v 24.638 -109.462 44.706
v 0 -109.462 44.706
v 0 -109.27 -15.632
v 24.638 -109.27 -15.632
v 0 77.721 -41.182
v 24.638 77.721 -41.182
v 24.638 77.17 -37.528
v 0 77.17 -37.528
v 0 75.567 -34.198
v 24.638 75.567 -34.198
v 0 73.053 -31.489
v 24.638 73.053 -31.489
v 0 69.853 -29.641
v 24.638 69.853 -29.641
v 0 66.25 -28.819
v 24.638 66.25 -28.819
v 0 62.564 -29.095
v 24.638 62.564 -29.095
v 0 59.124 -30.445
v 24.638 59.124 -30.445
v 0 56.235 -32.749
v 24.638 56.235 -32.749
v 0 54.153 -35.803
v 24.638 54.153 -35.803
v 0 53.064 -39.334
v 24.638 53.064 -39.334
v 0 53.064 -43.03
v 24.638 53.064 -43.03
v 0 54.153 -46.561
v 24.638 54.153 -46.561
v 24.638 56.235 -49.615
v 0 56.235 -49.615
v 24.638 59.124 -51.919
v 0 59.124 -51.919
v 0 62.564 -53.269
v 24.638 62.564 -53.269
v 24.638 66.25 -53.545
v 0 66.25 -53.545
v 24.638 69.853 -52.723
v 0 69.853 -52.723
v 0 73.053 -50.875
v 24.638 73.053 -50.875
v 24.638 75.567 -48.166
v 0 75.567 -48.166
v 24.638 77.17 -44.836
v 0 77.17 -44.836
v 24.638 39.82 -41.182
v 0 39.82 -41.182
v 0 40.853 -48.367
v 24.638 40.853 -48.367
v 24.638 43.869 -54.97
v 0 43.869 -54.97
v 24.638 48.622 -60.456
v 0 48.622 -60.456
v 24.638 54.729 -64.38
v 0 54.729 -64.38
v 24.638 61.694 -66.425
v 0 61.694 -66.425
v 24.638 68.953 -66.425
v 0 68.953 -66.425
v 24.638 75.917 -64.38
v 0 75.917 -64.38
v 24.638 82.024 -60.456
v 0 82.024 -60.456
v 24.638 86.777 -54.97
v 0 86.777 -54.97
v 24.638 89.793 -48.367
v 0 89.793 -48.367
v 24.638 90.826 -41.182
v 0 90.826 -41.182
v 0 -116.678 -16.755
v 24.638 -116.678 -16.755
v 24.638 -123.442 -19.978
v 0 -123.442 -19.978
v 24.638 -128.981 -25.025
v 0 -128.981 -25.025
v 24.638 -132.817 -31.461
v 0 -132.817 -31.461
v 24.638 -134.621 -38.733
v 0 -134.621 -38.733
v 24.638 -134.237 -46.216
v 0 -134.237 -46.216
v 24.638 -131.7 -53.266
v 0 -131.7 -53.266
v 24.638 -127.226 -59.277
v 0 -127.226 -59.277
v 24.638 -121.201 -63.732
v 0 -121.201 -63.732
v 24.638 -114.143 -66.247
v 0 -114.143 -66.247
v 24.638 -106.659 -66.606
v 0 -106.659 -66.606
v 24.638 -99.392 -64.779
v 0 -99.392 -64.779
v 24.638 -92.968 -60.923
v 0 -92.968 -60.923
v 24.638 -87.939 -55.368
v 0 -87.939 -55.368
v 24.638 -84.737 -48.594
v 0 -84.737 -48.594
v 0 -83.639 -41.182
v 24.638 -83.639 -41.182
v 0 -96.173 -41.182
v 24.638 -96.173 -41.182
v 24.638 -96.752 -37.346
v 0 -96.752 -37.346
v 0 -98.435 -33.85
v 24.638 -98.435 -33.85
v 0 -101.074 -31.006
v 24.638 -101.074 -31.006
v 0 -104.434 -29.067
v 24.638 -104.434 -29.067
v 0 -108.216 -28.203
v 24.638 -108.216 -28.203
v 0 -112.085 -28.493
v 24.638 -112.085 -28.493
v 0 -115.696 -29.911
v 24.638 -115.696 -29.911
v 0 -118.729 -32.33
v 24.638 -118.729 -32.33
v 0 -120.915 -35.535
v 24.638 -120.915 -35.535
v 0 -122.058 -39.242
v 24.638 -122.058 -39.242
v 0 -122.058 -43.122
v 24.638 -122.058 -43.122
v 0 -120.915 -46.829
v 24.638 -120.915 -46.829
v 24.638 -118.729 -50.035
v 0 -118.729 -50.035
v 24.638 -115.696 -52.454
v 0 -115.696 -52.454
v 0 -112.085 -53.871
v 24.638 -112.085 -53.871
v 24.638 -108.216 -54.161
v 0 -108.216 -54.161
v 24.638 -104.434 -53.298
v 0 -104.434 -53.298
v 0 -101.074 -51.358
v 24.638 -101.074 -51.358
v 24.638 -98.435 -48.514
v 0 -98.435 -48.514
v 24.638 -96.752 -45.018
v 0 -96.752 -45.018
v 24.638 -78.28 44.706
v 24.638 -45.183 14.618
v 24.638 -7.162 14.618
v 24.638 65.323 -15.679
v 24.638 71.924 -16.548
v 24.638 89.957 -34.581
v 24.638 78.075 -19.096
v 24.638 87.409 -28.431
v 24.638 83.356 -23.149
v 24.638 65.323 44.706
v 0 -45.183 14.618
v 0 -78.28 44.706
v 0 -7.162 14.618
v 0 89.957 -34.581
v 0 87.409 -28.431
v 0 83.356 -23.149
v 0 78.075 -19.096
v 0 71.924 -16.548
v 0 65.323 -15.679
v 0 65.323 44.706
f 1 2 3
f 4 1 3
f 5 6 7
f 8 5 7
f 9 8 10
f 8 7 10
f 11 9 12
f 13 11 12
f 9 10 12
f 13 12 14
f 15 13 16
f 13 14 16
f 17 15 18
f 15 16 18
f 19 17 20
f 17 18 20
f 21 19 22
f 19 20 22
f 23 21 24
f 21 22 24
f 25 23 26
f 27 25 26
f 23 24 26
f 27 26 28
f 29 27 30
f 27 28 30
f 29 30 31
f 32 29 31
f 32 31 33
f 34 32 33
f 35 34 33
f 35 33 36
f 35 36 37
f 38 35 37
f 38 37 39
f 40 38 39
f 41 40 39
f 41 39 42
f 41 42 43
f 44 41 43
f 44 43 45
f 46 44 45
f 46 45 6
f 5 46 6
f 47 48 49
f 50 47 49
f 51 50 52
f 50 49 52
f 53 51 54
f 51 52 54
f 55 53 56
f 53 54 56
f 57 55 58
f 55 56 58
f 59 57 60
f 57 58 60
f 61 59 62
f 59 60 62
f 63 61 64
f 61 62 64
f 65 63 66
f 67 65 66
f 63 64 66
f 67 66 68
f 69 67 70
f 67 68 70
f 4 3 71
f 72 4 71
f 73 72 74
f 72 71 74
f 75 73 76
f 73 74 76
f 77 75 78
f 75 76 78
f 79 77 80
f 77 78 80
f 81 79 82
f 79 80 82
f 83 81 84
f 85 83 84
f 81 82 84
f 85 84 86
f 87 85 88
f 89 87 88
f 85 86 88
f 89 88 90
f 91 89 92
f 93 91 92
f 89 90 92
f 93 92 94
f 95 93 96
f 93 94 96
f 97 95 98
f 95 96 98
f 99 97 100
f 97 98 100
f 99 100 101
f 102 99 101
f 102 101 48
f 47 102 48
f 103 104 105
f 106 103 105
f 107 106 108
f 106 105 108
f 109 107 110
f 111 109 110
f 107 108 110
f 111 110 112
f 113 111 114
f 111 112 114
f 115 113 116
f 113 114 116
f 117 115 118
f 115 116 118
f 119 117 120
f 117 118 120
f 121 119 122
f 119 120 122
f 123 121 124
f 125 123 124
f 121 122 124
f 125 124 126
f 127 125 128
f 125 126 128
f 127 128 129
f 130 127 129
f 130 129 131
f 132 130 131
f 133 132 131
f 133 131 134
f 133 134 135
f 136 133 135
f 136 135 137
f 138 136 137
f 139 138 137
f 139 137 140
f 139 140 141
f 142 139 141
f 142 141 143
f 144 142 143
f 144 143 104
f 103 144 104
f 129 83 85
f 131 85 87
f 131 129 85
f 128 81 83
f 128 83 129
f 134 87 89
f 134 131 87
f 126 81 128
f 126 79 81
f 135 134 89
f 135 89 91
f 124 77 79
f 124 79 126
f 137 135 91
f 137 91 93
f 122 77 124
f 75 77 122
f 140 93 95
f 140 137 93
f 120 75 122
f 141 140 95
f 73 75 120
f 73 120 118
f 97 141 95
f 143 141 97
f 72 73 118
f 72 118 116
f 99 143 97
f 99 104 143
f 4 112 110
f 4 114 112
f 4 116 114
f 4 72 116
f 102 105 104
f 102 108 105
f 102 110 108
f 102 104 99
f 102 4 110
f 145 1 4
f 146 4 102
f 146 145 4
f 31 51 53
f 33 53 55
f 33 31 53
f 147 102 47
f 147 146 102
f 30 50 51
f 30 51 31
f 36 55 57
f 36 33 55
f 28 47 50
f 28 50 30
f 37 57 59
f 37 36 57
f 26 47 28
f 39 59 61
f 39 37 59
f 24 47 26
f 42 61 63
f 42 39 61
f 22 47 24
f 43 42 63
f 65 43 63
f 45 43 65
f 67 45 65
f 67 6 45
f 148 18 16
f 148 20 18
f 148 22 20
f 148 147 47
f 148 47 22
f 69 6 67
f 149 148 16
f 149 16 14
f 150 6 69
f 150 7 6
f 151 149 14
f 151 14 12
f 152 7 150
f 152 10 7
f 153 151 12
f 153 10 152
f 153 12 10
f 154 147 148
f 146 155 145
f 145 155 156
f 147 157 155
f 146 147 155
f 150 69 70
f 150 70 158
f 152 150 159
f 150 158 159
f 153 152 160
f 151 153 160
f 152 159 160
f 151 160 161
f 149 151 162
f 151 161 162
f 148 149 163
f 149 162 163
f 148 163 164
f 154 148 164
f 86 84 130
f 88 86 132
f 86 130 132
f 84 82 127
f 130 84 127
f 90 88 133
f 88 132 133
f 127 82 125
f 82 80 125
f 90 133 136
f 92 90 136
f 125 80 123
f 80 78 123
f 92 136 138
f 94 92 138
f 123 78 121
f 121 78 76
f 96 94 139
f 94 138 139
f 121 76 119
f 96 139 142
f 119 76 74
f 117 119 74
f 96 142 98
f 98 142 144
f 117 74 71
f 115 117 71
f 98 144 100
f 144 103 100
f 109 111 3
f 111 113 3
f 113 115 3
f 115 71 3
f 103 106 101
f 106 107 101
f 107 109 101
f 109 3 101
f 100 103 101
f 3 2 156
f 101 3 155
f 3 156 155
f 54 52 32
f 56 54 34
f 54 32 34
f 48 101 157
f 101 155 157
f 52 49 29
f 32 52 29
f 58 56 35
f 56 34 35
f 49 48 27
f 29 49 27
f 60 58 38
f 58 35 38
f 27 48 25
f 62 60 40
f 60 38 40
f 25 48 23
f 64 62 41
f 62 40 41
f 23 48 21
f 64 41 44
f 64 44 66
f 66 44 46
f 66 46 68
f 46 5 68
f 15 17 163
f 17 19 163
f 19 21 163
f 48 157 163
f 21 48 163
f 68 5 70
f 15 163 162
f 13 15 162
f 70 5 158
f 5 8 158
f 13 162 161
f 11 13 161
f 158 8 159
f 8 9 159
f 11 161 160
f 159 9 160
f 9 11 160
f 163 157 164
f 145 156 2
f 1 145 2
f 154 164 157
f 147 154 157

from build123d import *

# Parameters (mm, degrees)
F1_DEPTH = 24.638
F2_R     = 13.015145
F2_R_2   = 12.398002
F3_DEPTH = 35.052


with BuildPart() as f1:
    # F0 (on Right) → F1 (new body)
    with BuildSketch(Plane.YZ):
        with BuildLine():
            Line((-109.188519, -41.18206), (-109.269887, -15.63245))
            ThreePointArc((-109.269887, -15.63245), (-127.226123, -59.277199), (-83.63878, -41.18206))
            Line((-83.63878, -41.18206), (-109.188519, -41.18206))
        make_face()
        with BuildLine():
            ThreePointArc((-83.63878, -41.18206), (-91.150916, -23.086921), (-109.269887, -15.63245))
            Line((-109.269887, -15.63245), (-109.188519, -41.18206))
            Line((-109.188519, -41.18206), (-83.63878, -41.18206))
        make_face()
        with BuildLine():
            Line((-78.279719, 44.706121), (-109.462045, 44.706121))
            Line((-109.462045, 44.706121), (-109.269887, -15.63245))
            ThreePointArc((-109.269887, -15.63245), (-91.150916, -23.086921), (-83.63878, -41.18206))
            Line((-83.63878, -41.18206), (39.820287, -41.18206))
            ThreePointArc((39.820287, -41.18206), (47.289896, -23.148827), (65.323129, -15.679217))
            Line((65.323129, -15.679217), (65.323129, 44.706121))
            Line((65.323129, 44.706121), (-7.162113, 14.617906))
            Line((-7.162113, 14.617906), (-45.182679, 14.617906))
            Line((-45.182679, 14.617906), (-78.279719, 44.706121))
        make_face()
        with BuildLine():
            Line((65.323129, -41.18206), (39.820287, -41.18206))
            ThreePointArc((39.820287, -41.18206), (65.323129, -66.684902), (90.825972, -41.18206))
            ThreePointArc((90.825972, -41.18206), (83.356362, -23.148827), (65.323129, -15.679217))
            Line((65.323129, -15.679217), (65.323129, -41.18206))
        make_face()
        with BuildLine():
            ThreePointArc((65.323129, -15.679217), (47.289896, -23.148827), (39.820287, -41.18206))
            Line((39.820287, -41.18206), (65.323129, -41.18206))
            Line((65.323129, -41.18206), (65.323129, -15.679217))
        make_face()
    extrude(amount=F1_DEPTH)

    # F2 (on face) → F3 (cut)
    with BuildSketch(Plane.YZ.offset(24.638)):
        with Locations((-109.188519, -41.18206)):
            Circle(F2_R)
        with Locations((65.323129, -41.18206)):
            Circle(F2_R_2)
    extrude(amount=-F3_DEPTH, mode=Mode.SUBTRACT)


solid = f1.part
